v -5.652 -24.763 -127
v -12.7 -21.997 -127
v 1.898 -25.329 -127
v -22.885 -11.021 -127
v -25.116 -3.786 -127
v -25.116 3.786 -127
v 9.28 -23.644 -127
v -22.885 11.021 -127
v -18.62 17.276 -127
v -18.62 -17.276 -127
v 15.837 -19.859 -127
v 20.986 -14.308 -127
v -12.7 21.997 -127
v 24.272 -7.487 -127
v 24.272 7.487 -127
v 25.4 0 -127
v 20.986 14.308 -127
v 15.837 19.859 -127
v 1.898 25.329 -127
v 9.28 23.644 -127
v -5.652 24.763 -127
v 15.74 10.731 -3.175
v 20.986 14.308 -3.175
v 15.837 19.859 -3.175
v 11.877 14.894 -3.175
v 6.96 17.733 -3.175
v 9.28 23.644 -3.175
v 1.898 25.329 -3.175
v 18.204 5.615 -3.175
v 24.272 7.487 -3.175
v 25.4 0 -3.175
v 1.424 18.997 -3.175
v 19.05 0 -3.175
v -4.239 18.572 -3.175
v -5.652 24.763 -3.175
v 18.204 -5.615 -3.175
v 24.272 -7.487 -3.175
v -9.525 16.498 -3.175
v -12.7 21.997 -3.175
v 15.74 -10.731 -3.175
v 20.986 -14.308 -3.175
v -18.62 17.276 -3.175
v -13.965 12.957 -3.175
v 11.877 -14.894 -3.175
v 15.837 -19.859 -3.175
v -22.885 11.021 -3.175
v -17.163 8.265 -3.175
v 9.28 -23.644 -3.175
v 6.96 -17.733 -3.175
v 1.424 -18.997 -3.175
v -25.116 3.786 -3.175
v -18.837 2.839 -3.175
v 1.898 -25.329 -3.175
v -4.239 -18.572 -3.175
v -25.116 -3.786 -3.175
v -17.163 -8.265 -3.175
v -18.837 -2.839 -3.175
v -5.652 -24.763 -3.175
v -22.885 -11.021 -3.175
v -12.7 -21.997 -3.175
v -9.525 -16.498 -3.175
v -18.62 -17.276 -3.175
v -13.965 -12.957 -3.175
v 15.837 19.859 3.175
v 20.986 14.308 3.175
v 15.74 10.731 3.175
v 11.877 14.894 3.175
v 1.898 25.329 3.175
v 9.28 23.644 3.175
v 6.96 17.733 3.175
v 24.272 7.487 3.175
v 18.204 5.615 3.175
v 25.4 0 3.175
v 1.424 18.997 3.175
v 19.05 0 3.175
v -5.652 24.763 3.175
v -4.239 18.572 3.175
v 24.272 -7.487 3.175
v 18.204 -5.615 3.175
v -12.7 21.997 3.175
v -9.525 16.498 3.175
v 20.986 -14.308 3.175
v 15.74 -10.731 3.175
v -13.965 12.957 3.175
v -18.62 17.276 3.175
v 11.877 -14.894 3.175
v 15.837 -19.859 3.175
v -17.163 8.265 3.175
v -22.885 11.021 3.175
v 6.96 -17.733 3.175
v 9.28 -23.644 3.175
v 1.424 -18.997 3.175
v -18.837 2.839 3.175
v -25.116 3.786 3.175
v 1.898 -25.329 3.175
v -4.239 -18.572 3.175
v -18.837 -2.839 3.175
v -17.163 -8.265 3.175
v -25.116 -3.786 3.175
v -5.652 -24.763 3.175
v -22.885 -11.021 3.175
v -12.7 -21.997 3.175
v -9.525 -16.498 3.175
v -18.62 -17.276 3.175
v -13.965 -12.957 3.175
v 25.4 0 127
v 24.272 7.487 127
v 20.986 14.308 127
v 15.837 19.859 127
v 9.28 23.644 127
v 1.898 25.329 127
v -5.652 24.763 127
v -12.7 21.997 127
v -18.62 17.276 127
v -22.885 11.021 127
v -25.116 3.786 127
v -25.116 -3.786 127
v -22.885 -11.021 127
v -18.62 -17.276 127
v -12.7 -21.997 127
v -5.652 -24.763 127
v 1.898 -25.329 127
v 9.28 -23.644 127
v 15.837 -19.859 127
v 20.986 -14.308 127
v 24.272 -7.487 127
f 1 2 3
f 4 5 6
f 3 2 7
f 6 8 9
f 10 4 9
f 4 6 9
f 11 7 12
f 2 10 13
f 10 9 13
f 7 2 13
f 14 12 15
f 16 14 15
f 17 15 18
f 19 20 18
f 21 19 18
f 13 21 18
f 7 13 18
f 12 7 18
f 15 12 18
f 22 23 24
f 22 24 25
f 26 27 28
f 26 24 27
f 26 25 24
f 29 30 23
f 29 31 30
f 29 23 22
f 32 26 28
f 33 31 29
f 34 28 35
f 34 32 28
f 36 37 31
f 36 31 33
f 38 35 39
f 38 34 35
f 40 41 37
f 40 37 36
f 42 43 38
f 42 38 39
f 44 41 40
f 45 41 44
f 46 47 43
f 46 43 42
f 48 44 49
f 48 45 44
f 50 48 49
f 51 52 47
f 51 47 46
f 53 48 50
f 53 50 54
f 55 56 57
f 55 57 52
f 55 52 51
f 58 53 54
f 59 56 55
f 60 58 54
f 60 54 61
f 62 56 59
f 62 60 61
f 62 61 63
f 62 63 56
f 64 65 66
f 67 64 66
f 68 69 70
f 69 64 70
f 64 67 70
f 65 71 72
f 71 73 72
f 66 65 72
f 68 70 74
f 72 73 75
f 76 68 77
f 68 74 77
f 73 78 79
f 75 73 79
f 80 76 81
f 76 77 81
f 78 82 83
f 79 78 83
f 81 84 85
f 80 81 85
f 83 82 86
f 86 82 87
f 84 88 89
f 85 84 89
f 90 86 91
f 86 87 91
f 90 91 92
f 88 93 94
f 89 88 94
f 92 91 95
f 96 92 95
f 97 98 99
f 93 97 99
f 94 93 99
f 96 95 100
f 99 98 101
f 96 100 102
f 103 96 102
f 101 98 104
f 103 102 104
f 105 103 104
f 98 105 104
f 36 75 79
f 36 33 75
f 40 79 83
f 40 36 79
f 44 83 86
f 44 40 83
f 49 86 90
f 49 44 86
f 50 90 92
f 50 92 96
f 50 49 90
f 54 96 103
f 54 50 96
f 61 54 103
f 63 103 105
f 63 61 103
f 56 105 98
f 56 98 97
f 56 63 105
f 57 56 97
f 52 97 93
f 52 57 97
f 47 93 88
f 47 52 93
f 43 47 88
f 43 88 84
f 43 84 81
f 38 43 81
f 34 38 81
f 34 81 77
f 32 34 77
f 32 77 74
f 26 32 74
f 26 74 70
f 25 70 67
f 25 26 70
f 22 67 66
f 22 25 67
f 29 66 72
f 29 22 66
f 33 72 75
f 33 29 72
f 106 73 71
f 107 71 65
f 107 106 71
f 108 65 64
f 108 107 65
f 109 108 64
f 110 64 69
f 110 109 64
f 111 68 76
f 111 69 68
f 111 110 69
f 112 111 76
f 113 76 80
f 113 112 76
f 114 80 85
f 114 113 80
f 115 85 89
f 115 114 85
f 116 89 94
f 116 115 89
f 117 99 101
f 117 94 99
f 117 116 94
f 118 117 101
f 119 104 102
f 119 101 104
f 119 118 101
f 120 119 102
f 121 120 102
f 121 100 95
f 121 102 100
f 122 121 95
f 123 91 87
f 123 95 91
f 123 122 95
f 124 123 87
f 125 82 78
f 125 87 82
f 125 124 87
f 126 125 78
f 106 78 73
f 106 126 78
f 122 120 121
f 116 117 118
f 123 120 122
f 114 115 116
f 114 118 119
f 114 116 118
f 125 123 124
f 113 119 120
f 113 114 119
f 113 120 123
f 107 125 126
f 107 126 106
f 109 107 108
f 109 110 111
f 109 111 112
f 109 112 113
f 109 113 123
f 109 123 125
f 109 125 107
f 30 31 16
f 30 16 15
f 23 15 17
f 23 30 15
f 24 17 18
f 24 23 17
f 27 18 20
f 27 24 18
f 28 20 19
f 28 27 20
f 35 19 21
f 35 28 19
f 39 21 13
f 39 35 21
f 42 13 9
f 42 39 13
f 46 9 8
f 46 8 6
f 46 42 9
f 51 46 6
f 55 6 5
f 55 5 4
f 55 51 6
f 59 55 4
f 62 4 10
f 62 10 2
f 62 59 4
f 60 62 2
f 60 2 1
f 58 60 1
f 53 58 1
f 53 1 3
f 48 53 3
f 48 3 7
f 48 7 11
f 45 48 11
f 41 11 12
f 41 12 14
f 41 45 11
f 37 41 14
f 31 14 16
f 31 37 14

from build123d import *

# Parameters (mm, degrees)
SKETCH1_R           = 25.4
BOSS_EXTRUDE1_DEPTH = 127
SKETCH2_W           = 6.35
SKETCH2_H           = 6.35


with BuildPart() as part:
    # Sketch1 → Boss-Extrude1 (new body, symmetric)
    with BuildSketch(Plane.XY):
        Circle(SKETCH1_R)
    extrude(amount=BOSS_EXTRUDE1_DEPTH, both=True)

    # Sketch2 → Cut-Revolve1 (revolve, cut)
    with BuildSketch(Plane(origin=(0, 0, 0), x_dir=(0, 0, -1), z_dir=(1, 0, 0)), mode=Mode.PRIVATE) as cut_revolve1_sk:
        with Locations((0, 22.225)):
            Rectangle(SKETCH2_W, SKETCH2_H)
    revolve(cut_revolve1_sk.sketch.rotate(Axis((0, 0, 127), (0, 0, -1)), 90), axis=Axis((0, 0, 127), (0, 0, -1)), mode=Mode.SUBTRACT)  # turned: the seam where the file's is


solid = part.part
